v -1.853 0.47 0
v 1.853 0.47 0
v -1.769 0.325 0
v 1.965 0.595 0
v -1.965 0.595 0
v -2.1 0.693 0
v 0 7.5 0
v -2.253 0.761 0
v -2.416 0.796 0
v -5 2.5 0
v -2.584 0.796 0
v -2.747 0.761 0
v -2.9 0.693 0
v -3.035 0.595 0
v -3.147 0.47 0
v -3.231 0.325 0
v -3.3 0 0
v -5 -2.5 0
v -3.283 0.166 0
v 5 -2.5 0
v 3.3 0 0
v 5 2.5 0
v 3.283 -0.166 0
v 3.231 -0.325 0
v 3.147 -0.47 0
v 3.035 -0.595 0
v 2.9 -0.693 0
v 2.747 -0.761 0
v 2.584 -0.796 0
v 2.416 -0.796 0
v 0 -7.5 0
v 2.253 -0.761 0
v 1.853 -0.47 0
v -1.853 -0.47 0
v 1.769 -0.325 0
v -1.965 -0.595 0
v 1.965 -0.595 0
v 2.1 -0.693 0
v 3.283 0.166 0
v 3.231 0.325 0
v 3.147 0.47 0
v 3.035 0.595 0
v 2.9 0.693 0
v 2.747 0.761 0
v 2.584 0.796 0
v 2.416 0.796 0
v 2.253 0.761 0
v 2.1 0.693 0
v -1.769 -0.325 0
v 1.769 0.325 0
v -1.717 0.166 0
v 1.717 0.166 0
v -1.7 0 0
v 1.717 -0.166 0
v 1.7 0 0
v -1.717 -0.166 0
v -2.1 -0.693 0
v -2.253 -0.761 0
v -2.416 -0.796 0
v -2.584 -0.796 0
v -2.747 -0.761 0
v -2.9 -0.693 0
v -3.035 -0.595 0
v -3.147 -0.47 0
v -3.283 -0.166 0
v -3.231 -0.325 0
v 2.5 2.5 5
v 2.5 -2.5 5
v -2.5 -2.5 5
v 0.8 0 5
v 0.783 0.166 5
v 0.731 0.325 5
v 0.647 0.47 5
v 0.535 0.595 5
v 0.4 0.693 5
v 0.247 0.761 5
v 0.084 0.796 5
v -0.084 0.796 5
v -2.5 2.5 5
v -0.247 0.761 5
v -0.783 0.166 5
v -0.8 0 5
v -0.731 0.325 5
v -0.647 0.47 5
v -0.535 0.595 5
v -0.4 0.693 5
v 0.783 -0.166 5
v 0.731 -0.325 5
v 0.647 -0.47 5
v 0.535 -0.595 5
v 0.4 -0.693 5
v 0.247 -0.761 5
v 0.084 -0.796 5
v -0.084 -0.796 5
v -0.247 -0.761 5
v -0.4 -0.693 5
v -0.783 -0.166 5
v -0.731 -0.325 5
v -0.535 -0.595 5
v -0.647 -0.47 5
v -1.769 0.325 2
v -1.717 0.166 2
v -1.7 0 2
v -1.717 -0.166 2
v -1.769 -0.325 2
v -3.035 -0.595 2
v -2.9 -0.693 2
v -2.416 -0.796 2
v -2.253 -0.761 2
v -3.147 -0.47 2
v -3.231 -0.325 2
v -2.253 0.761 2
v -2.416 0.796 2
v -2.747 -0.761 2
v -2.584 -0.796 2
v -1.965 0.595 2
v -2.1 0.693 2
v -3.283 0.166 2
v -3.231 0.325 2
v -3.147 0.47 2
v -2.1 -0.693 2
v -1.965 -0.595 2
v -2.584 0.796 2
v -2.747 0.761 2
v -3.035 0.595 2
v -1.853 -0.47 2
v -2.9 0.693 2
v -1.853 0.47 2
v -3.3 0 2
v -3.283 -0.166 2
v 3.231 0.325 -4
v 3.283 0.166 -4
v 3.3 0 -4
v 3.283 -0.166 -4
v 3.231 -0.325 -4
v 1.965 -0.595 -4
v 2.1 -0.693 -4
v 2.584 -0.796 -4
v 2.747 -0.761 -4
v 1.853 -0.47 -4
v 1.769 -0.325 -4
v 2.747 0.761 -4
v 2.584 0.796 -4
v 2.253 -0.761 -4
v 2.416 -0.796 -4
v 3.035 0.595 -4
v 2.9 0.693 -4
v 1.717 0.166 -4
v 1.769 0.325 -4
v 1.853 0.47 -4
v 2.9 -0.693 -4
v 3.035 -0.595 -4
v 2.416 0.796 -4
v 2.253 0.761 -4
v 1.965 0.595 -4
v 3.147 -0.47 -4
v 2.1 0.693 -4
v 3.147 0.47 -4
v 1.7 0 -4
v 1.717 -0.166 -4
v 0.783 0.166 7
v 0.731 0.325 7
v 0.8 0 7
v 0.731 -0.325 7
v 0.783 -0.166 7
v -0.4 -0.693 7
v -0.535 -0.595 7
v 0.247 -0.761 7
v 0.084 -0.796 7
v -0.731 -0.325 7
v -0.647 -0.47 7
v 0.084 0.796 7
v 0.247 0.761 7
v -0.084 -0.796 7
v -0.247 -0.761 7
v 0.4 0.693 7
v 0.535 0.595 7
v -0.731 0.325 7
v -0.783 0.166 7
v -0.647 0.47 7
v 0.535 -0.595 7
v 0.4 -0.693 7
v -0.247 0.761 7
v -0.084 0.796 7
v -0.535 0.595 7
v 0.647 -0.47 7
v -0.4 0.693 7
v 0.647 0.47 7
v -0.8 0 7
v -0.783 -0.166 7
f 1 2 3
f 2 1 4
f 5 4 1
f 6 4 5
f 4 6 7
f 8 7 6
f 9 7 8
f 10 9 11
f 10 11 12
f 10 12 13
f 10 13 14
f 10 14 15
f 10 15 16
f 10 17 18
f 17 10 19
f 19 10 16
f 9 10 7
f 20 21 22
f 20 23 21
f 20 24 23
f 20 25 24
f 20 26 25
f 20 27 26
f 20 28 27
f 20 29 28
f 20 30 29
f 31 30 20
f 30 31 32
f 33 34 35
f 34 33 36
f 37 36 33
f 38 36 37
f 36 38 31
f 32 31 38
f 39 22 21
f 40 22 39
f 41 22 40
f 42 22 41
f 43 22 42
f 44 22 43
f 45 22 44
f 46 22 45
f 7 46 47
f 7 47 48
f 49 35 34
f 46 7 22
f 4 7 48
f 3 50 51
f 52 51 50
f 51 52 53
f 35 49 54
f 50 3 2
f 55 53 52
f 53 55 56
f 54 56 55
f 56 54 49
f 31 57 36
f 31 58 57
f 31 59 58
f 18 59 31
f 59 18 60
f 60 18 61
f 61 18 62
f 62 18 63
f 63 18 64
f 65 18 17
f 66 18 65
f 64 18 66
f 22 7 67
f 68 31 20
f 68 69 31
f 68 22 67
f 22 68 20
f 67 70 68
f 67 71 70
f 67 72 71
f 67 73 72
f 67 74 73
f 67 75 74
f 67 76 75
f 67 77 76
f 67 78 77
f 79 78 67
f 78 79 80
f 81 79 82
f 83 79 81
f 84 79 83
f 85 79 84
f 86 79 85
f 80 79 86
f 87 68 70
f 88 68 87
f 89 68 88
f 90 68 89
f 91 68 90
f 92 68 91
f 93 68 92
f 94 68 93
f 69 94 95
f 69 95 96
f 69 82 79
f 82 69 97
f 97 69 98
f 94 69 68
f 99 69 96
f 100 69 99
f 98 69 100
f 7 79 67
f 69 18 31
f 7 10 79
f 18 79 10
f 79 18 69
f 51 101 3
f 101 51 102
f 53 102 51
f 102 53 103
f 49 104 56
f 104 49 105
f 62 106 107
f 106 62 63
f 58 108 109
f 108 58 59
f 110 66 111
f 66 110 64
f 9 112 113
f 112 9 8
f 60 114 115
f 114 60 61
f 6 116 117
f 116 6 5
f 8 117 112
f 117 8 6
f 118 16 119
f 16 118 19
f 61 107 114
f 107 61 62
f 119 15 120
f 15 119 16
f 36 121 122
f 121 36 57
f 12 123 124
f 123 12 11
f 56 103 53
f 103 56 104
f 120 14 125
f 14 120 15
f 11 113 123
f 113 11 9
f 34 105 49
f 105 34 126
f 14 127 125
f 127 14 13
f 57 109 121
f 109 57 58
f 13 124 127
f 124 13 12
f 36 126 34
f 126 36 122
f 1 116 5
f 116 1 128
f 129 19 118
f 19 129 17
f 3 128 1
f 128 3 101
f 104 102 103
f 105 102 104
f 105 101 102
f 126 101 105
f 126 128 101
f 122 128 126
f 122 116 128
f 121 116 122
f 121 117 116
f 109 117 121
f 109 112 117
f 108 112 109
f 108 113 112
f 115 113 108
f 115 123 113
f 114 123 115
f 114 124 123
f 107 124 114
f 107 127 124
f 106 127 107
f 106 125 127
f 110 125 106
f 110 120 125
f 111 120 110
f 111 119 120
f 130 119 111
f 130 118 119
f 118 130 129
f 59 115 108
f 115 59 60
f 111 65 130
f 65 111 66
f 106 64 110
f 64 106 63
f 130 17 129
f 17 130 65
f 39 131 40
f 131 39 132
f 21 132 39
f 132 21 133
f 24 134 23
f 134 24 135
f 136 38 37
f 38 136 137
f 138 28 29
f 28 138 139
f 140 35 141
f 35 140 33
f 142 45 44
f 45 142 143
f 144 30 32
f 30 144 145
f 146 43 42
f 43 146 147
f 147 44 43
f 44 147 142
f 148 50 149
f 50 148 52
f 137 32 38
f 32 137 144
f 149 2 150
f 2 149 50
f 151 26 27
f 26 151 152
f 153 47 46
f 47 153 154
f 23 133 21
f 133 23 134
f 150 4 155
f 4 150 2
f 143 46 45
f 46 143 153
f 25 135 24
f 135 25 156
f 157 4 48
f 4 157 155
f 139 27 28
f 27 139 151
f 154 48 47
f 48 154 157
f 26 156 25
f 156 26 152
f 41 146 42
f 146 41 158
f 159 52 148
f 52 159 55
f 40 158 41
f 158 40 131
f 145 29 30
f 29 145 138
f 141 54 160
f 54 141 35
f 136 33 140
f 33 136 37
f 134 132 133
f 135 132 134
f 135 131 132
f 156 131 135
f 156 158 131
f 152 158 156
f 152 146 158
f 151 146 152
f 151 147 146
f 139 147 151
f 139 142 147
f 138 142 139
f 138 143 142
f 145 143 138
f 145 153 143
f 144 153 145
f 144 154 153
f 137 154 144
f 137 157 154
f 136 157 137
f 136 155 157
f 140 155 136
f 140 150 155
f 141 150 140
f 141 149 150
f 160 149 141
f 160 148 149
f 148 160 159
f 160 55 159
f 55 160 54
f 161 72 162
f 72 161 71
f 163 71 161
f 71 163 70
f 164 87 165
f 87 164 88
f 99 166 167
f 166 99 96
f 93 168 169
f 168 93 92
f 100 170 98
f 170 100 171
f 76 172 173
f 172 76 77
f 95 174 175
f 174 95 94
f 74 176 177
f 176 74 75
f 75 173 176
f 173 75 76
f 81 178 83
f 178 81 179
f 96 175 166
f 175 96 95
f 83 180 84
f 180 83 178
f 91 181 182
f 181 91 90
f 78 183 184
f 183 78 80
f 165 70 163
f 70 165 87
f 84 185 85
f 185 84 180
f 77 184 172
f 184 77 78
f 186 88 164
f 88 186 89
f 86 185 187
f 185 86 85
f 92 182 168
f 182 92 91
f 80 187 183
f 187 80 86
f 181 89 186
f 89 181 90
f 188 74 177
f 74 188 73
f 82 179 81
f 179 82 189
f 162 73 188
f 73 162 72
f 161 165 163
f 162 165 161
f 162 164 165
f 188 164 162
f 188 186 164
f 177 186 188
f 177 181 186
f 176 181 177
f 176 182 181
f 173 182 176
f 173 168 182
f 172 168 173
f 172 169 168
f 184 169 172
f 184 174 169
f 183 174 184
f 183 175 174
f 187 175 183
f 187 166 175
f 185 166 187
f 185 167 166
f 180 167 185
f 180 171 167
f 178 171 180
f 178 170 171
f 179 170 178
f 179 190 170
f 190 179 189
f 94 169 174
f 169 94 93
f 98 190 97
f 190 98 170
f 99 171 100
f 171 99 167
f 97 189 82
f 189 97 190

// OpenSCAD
$fn =30;
module peghole(){
    color("Blue")cylinder (6, .8, .8, true);
}
// the peg hole template, a change in size here changes hole everywhere


module edge(){
cylinder (5, 3.25, 3.25, true);
}
// a cylinder for making block


module block(){
    intersection(){
edge();
rotate([90,0,0]) edge();
rotate([0, 90, 0]) edge();
}
}
// create the base cube without the holes


module blox(){
difference(){ 
block();
   peghole();
rotate ([90, 0, 0]) peghole();
rotate ([0, 90, 0]) peghole();
}
}
//unembeleshed blox cube

module cross(){
blox();
translate([5,0,0]) blox();
translate([-5,0,0]) blox();
translate([0,0,5]) blox();
translate([0,0,-5]) blox();
}
// central blox cross

module corner(){difference(){
    block();
   translate([-3,-3,3])rotate([0,45,0])
cube([8,6
   ,4]) color("Red");
 rotate([0,90,0])
   translate([0,0,-4]) peghole();
 translate([0,0,-4]) peghole();   
 rotate([0,45,0]) translate([0,0,1])peghole();   
}
}
    
//anled blox piece

module side(){
    blox();
    translate([0,0,5])corner();
translate([0,0,-5]) rotate([0,90,0]) corner();
}
// Pentagram side of octagon, can be own piece

module 3long() {
    blox();
    translate([0,0,5]) blox();
    translate([0,0,-5]) blox();
}

module opcorner(){
    translate([5,0,5]) corner();
translate([-5,0,-5]) rotate([0,180,0])corner();
}
// unused now


module oct() {
3long();
translate([5,0,0]) side();
translate([-5,0,0]) rotate([0,180,0]) side();
}
// one octagon of blox, can be used as own piece

module longside() {
side();
translate([0,5,0]) side();
translate([0,-5,0]) side();
}
// long side can be used as own piece

module hexlong(){
longside();
translate([-5,0,0]) rotate([0,180,0]) longside();
}
// long side in the combined form, usable as piece


module 3X3() {
3long();
translate([0,5,0]) 3long();
translate([0,-5,0]) 3long();
}
// plate of 3X3 blox can be used as own piece


module long(){
    oct();
translate([0,5,0]) oct();
translate([0,-5,0]) oct();
}
// octoganal tube with solid fill

module longhollow(){
difference(){
long();
cube([10,10,5], true);
cube([5,10,10], true);
}
}
// lighter octoganal tube

module test(){
translate([0,0,10]) blox();
rotate([0,45,0]) translate([0,0,9.5]) blox();
}
// set up angle for bracket design
module core() {
    color("Red") translate([0,0,2.5]) blox();
    color("Red");
}
//core();
module caplower(){
CapPoints = [ [0,7.5,0],[5,2.5,0],[5,-2.5,0],[0,-7.5,0],[0,2.35,4.6],[2.35,2.35,4.6],[2.35,-2.35,4.6],[0,-2.35,4.6] ];
CapFaces = [ [0,1,2,3],[1,0,5],[3,2,6],[3,6,7],[3,7,4,0],[2,1,5,6],[5,4,7,6],[4,5,0] ];
polyhedron(CapPoints, CapFaces,convexity = 1);
}
// creates a cap with a petruding blox, needs finetuning
module halfflatcap() {
    CapPoints = [ [0,7.5,0],[5,2.5,0],[5,-2.5,0],[0,-7.5,0],[0,2.5,5],[2.5,2.5,5],[2.5,-2.5,5],[0,-2.5,5] ];
CapFaces = [ [0,1,2,3],[1,0,5],[3,2,6],[3,6,7],[3,7,4,0],[2,1,5,6],[5,4,7,6],[4,5,0] ];
polyhedron(CapPoints, CapFaces,convexity = 1);
}
module fulflatcap() {
    halfflatcap();
rotate ([0,0,180]) halfflatcap();
}

//fulflatcap();
difference(){
fulflatcap();
translate([-2.5,0,-1]) peghole();
}
translate([2.5,0,-1]) peghole();
translate([0,0,4]) peghole();

// make half a cao for hex with sides flush with top of blox
//no holes yet


module bracketbase(){
    difference(){
rotate([0,30,0])translate([1,0,-1]) cube([5,3,5], true);
translate([-2.5,0,-10]) test();
 translate([-4,-3,-3])cube([3,5,5]);translate([-.5,0,-4.5])rotate([0,30,0]) cube(4.1, true);translate([-4,-2,-5])cube(4);    
  }
}
